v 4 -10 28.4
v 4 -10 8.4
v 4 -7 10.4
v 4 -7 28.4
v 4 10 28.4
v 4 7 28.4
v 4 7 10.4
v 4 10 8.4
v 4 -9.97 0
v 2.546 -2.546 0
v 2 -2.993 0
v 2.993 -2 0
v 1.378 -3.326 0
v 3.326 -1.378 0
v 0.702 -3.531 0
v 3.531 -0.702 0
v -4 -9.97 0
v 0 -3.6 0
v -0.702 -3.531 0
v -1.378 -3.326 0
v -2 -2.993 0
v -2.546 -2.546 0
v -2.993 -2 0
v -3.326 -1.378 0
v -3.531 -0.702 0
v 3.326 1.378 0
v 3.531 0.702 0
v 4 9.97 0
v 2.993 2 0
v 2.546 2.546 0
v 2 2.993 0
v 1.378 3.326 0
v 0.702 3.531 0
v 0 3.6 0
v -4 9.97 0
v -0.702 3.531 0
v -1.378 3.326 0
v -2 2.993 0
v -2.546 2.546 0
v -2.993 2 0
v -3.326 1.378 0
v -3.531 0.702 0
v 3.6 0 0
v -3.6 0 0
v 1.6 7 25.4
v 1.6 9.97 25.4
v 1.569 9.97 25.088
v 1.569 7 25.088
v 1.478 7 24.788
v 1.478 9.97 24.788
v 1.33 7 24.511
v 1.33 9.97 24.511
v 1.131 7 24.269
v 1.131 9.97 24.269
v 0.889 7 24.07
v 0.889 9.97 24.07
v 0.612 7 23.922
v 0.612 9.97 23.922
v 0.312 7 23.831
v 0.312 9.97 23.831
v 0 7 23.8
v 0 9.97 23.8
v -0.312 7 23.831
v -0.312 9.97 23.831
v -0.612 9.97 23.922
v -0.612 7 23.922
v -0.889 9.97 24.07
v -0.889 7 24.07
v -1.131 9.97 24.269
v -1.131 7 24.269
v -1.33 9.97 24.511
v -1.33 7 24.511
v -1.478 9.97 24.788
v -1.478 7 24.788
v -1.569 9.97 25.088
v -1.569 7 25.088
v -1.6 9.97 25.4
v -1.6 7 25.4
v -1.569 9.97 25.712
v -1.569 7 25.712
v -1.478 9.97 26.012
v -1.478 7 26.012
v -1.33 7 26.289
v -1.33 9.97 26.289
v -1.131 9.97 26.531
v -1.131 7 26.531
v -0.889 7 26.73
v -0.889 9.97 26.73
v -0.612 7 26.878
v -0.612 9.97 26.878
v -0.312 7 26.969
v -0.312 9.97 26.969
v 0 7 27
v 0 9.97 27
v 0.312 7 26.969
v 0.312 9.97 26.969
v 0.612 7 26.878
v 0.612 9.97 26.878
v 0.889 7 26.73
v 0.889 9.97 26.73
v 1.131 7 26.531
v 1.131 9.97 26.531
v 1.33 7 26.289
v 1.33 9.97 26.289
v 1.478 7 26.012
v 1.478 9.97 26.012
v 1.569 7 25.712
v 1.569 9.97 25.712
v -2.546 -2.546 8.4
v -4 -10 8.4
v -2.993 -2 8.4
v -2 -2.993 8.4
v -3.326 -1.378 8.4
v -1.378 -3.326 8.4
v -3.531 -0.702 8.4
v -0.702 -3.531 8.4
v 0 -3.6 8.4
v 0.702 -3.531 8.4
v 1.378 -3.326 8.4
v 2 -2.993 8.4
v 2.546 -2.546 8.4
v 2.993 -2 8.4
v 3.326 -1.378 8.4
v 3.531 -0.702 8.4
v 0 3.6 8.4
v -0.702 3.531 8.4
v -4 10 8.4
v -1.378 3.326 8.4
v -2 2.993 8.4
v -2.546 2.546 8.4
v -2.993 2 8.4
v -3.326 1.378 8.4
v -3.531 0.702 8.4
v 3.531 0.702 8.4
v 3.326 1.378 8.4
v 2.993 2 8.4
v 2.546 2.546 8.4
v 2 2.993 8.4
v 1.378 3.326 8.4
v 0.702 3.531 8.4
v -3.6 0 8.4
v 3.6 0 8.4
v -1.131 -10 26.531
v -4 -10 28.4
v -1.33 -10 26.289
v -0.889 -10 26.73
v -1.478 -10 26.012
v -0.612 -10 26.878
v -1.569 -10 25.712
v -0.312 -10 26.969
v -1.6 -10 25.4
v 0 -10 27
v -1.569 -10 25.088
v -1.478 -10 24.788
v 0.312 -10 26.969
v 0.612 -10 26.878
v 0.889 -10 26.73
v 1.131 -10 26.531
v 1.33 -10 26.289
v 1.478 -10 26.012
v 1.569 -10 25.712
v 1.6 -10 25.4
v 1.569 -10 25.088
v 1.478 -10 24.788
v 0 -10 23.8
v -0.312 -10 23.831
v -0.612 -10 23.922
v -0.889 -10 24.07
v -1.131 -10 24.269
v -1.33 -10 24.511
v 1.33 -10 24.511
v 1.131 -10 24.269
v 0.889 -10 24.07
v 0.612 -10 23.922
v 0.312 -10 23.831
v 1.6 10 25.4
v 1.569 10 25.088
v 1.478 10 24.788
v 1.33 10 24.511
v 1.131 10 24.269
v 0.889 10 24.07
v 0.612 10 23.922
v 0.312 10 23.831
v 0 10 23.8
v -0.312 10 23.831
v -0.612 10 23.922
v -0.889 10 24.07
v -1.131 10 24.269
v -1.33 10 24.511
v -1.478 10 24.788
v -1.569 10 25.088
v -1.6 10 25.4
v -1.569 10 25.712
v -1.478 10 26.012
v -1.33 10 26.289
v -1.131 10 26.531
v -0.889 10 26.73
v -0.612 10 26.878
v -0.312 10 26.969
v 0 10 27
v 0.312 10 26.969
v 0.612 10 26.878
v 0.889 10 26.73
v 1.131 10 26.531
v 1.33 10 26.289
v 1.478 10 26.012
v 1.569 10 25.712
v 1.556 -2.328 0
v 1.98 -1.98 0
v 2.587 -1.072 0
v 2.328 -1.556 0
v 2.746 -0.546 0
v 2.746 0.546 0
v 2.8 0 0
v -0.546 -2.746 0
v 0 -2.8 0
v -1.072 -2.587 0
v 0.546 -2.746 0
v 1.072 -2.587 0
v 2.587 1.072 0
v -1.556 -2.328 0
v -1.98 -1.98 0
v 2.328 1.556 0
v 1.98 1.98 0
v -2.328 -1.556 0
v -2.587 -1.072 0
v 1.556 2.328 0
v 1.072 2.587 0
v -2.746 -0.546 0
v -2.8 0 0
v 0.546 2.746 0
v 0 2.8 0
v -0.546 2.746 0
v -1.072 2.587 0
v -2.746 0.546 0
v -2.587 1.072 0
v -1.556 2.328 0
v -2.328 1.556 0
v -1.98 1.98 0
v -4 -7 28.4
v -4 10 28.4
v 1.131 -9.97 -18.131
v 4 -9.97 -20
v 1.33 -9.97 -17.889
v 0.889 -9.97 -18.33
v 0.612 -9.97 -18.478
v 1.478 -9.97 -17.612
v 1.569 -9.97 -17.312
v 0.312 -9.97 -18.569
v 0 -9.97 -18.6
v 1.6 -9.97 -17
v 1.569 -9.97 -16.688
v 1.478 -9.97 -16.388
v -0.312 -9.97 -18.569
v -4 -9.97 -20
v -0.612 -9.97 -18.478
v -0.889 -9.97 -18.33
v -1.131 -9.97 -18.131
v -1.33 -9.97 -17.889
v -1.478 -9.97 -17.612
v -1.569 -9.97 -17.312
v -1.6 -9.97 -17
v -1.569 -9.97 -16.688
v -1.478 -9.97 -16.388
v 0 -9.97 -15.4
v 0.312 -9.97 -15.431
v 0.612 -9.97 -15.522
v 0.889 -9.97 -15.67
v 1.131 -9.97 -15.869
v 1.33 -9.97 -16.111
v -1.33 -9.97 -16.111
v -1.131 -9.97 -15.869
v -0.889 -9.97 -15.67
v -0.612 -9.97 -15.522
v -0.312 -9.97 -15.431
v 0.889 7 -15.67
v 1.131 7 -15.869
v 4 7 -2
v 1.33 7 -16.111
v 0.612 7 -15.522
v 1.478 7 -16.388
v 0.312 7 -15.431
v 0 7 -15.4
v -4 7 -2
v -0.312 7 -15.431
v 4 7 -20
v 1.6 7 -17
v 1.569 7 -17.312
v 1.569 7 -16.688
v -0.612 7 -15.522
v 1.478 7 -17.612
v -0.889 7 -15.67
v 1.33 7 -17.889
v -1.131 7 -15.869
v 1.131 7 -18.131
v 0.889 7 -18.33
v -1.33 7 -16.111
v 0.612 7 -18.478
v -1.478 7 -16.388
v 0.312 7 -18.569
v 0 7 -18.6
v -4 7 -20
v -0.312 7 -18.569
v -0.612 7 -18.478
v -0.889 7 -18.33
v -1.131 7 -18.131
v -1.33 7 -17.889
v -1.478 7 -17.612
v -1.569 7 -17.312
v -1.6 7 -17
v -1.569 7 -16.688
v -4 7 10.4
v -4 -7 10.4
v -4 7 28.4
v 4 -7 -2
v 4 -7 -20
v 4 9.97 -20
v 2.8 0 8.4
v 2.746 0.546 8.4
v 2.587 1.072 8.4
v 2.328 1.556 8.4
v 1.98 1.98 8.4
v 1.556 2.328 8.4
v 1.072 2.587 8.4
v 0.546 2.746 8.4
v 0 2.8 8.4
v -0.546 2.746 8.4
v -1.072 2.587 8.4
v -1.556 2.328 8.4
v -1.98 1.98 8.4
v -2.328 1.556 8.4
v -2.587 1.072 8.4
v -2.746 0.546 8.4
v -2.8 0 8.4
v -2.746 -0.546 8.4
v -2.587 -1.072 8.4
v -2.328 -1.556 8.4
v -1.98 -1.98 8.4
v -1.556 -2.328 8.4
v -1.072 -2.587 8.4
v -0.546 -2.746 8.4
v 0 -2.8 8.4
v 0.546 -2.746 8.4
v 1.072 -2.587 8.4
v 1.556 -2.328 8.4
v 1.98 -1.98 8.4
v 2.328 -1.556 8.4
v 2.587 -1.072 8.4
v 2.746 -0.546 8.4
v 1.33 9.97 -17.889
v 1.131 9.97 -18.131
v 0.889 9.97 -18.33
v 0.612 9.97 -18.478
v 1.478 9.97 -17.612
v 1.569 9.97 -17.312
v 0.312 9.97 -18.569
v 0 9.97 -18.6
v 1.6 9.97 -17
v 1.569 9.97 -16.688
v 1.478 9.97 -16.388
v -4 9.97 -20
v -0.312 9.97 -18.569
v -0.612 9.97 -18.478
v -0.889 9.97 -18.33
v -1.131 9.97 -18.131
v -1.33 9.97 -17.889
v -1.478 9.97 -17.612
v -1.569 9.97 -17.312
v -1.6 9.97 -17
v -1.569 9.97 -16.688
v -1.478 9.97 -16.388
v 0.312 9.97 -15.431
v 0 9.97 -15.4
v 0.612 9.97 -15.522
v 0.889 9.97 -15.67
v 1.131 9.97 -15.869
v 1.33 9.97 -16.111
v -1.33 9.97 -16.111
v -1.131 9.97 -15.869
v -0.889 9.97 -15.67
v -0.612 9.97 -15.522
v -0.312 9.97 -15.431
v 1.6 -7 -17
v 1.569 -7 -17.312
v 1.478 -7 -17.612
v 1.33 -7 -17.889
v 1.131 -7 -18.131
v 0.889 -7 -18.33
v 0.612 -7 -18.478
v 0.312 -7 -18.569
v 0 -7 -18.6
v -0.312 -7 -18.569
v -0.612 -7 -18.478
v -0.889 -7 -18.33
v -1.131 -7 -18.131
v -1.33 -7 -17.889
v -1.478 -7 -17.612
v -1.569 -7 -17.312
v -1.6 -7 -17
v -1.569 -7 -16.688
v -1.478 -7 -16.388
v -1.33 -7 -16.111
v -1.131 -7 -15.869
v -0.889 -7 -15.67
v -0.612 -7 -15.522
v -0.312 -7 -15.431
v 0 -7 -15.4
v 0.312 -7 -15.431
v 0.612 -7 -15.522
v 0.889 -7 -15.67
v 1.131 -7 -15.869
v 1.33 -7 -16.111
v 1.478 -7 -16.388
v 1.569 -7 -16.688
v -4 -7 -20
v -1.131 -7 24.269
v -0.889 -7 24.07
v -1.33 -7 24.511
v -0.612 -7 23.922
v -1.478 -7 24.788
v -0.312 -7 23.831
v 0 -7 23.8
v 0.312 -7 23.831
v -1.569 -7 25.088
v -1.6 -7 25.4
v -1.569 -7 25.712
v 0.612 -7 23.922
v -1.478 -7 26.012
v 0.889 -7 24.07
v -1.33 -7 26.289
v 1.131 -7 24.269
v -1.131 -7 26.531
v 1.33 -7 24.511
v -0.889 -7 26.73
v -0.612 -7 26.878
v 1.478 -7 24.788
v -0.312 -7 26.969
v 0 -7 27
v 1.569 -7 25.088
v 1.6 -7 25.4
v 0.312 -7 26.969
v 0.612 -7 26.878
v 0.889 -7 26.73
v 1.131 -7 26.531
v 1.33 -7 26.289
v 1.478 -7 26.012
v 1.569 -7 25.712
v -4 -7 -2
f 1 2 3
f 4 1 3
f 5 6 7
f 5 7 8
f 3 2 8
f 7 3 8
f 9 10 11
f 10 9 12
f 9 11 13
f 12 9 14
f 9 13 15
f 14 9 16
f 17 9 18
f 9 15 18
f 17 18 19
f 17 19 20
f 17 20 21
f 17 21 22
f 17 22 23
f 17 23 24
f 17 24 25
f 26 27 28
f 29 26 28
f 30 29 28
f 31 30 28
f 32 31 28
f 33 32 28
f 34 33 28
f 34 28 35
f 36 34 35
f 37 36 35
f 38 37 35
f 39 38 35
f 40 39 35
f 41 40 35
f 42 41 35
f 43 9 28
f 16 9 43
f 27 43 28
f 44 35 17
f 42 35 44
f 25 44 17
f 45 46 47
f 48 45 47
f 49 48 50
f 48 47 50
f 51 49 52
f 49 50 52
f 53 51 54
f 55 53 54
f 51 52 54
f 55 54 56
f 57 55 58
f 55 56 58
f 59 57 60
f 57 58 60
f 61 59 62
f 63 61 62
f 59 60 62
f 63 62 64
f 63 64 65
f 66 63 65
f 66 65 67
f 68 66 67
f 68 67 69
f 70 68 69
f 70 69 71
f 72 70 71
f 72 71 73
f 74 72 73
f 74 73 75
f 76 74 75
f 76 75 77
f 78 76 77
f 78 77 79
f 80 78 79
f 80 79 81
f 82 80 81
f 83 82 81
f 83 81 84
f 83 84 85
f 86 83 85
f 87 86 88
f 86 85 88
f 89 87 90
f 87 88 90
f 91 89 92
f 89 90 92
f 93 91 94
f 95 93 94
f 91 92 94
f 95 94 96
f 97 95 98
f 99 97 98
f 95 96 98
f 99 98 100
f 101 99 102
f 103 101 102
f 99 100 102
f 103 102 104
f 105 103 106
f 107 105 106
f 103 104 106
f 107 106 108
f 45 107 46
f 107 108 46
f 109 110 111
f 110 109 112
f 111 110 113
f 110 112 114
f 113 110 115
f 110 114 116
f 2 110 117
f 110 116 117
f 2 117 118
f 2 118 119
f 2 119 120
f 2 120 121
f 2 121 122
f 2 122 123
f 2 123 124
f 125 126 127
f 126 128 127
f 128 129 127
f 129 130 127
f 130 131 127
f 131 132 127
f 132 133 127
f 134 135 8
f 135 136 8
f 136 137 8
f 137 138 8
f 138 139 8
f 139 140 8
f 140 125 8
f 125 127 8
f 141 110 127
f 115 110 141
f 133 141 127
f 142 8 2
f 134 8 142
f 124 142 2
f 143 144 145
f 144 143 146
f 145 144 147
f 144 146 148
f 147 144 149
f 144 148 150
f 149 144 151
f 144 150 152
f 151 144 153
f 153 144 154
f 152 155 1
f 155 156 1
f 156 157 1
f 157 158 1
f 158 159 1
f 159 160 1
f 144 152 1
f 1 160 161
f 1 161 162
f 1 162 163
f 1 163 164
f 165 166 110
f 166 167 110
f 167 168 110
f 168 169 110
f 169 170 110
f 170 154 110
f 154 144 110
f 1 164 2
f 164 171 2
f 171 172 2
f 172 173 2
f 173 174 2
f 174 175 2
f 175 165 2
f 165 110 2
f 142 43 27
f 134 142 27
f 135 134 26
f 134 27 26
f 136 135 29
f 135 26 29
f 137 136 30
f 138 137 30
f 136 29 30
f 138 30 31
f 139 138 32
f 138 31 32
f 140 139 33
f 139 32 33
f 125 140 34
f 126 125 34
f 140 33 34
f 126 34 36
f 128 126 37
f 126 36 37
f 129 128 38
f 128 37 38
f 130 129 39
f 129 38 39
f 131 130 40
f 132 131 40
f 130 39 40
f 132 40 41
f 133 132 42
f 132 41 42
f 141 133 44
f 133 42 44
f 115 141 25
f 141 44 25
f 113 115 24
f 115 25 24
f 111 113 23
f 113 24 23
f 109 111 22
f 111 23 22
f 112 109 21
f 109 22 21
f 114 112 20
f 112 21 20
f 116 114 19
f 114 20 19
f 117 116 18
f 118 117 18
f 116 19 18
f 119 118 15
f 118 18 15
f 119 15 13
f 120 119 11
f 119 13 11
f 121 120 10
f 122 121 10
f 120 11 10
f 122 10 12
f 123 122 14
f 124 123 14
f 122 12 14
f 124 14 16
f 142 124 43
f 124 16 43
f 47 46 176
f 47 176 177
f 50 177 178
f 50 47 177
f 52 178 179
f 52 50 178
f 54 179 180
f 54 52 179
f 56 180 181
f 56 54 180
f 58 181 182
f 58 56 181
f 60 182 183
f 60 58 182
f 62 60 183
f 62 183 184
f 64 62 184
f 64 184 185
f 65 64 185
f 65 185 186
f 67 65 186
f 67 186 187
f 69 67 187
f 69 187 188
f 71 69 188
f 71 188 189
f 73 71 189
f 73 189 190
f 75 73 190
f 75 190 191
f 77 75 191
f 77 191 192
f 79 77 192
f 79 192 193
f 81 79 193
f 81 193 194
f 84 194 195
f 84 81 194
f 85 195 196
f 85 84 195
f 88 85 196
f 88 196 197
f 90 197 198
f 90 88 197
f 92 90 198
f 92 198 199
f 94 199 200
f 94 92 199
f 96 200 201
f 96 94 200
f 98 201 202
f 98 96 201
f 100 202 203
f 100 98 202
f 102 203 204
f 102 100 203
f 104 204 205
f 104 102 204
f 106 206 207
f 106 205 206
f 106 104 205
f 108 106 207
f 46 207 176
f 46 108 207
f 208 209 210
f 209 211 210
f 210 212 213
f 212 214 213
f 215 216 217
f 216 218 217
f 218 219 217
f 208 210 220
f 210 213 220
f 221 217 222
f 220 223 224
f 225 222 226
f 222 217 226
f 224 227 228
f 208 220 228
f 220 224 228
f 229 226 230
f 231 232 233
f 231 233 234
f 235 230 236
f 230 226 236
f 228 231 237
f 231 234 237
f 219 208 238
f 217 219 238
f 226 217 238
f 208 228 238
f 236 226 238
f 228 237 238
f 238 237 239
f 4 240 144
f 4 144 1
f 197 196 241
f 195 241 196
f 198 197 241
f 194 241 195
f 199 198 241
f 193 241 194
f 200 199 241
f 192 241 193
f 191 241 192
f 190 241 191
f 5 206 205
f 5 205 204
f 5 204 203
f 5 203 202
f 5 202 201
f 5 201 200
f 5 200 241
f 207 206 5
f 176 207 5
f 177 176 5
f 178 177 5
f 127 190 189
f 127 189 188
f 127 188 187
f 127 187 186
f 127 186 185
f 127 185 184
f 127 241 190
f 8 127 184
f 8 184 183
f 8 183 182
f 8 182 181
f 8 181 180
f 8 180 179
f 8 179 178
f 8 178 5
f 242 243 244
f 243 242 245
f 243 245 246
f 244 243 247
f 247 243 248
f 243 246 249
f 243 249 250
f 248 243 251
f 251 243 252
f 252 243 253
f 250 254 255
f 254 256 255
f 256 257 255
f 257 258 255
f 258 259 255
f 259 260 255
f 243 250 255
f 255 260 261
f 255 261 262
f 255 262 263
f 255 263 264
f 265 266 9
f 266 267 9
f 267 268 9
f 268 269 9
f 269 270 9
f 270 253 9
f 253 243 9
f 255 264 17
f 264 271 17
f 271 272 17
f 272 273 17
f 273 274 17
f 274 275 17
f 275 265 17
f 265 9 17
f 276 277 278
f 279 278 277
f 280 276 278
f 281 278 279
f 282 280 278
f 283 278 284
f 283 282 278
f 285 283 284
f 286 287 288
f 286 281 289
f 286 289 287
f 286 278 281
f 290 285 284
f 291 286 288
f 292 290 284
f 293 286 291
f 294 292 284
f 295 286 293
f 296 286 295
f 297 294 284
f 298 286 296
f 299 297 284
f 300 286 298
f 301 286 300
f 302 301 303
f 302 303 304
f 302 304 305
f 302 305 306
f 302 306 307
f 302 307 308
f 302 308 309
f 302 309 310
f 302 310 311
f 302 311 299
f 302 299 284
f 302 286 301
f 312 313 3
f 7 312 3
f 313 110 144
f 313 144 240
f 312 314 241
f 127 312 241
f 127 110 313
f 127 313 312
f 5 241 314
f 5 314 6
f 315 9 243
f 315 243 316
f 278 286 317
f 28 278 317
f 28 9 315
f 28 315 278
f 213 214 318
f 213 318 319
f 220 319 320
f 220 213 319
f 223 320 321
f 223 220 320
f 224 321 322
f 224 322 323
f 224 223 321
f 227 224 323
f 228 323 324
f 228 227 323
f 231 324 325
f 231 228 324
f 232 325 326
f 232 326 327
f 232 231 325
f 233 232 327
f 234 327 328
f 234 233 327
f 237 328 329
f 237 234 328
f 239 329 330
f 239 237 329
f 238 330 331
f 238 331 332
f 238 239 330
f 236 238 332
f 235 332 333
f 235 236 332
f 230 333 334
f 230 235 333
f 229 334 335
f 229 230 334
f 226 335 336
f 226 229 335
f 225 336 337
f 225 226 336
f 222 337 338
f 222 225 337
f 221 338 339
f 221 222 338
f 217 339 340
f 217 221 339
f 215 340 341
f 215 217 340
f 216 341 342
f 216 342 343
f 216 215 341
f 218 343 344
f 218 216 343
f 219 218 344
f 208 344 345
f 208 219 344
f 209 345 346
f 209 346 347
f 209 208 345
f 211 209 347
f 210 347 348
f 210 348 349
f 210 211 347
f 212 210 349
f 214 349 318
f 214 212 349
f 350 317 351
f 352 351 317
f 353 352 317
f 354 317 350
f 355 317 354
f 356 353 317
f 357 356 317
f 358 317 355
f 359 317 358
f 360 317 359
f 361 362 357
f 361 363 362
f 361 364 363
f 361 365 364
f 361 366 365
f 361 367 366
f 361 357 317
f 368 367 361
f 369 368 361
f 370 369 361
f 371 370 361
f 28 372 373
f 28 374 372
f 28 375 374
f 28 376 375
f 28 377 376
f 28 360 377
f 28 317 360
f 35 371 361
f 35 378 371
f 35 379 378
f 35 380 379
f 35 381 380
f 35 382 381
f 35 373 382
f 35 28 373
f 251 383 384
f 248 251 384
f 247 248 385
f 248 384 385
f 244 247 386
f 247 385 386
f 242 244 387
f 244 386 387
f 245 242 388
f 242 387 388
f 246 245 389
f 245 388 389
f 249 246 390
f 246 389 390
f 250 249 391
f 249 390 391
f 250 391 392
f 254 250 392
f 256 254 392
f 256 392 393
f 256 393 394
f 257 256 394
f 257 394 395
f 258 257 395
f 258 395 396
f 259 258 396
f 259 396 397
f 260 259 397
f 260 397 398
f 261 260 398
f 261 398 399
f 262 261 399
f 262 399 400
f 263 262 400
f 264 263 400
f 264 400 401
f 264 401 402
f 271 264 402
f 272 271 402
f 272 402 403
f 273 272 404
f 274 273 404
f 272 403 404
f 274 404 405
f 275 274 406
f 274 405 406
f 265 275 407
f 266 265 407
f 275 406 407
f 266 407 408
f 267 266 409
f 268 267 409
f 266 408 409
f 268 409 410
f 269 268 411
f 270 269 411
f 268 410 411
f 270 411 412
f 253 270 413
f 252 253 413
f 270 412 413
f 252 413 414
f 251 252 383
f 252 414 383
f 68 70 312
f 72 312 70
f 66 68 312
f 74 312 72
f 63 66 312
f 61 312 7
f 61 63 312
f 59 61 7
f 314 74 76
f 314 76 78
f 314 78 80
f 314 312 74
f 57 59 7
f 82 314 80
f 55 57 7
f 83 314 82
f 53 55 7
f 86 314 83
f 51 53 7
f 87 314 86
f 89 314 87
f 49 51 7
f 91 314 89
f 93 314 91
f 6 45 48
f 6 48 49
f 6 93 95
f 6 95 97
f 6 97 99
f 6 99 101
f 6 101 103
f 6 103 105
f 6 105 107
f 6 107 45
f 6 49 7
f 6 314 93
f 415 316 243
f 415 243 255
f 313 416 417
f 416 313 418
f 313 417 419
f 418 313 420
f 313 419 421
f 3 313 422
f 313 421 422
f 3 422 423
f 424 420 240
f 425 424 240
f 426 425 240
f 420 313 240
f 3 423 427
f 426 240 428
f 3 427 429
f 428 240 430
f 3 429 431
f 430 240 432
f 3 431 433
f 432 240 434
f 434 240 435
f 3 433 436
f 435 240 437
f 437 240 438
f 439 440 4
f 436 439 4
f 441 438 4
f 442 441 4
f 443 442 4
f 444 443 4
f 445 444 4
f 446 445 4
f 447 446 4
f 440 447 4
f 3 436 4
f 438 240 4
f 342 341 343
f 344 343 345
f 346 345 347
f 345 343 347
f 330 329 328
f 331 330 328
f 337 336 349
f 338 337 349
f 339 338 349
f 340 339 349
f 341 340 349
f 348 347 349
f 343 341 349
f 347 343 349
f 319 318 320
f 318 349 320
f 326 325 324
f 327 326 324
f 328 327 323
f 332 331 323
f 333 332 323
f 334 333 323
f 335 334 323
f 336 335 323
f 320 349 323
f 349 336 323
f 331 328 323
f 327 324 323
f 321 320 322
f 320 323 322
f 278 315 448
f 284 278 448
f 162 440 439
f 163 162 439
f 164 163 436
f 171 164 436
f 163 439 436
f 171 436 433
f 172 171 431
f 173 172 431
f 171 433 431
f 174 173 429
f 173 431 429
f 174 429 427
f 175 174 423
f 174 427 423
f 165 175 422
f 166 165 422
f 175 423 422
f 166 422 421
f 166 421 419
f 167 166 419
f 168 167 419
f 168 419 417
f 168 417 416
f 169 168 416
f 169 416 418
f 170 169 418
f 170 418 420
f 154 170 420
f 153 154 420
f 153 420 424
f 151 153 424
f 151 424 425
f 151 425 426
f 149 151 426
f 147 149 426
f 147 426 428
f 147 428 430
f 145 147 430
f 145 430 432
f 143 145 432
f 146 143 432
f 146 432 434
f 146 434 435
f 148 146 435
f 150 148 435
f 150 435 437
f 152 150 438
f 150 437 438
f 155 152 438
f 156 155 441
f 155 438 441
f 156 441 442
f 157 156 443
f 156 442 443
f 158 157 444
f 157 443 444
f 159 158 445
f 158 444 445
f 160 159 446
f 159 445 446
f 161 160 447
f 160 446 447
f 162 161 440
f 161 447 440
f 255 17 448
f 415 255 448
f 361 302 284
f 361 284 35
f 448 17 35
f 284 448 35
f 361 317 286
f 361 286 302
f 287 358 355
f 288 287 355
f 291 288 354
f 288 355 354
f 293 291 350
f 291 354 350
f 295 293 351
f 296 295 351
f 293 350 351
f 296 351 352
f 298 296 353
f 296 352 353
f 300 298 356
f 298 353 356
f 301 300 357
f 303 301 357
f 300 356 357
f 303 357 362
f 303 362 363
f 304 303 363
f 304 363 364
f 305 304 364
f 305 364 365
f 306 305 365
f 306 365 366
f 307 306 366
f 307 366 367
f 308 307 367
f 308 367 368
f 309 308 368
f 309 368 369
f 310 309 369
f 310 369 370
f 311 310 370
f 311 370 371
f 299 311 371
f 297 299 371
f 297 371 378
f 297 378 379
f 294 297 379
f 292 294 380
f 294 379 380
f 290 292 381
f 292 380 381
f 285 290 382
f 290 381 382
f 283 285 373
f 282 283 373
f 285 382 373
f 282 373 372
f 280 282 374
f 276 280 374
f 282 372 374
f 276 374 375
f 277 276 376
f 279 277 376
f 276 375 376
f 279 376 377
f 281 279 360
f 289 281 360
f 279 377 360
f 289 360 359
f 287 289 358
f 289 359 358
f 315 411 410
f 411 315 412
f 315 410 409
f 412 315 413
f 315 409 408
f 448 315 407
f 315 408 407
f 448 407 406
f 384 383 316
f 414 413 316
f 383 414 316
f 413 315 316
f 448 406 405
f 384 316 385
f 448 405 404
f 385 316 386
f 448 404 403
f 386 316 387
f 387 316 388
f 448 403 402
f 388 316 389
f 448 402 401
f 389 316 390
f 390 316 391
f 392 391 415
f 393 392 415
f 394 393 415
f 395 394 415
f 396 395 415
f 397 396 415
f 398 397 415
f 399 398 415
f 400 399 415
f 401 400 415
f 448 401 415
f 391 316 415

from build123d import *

# Parameters (mm, degrees)
SKETCH_1_R               = 3.6
SKETCH_1_R_2             = 2.8
EXTRUDE_1_DEPTH          = 8.4
SKETCH_2_W               = 8
SKETCH_2_H               = 19.939100818
EXTRUDE_2_DEPTH          = 20
SKETCH_3_W               = 8
SKETCH_3_H               = 20
EXTRUDE_3_DEPTH          = 20
SKETCH_4_W               = 8
SKETCH_4_H               = 14
CUT_EXTRUDE_2_DEPTH      = 18
SKETCH_5_W               = 8
SKETCH_5_H               = 14
CUT_EXTRUDE_3_DEPTH      = 18
SKETCH_6_R               = 1.6
CUT_EXTRUDE_4_DEPTH      = 10
CUT_EXTRUDE_4_DEPTH_BACK = 29


with BuildPart() as part:
    # 草图1 → 凸台-拉伸1 (new body)
    with BuildSketch(Plane.XY):
        Circle(SKETCH_1_R)
        Circle(SKETCH_1_R_2, mode=Mode.SUBTRACT)
    extrude(amount=EXTRUDE_1_DEPTH)

    # 草图2 → 凸台-拉伸2 (add)
    with BuildSketch(Plane(origin=(0, 0, 0), x_dir=(-1, 0, 0), z_dir=(0, 0, -1))):
        Rectangle(SKETCH_2_W, SKETCH_2_H)
    extrude(amount=EXTRUDE_2_DEPTH)

    # 草图3 → 凸台-拉伸3 (add)
    with BuildSketch(Plane.XY.offset(8.4)):
        Rectangle(SKETCH_3_W, SKETCH_3_H)
    extrude(amount=EXTRUDE_3_DEPTH)

    # 草图4 → 切除-拉伸2 (cut)
    with BuildSketch(Plane(origin=(0, 0, -20), x_dir=(-1, 0, 0), z_dir=(0, 0, -1))):
        Rectangle(SKETCH_4_W, SKETCH_4_H)
    extrude(amount=-CUT_EXTRUDE_2_DEPTH, mode=Mode.SUBTRACT)

    # 草图5 → 切除-拉伸3 (cut)
    with BuildSketch(Plane.XY.offset(28.4)):
        Rectangle(SKETCH_5_W, SKETCH_5_H)
    extrude(amount=-CUT_EXTRUDE_3_DEPTH, mode=Mode.SUBTRACT)

    # 草图6 → 切除-拉伸4 (cut, two sides)
    with BuildSketch(Plane(origin=(0, 9.969550409, 0), x_dir=(1, 0, 0), z_dir=(0, 1, 0))) as cut_extrude_4_sk:
        with Locations((0, 17)):
            Circle(SKETCH_6_R)
        with Locations((0, -25.4)):
            Circle(SKETCH_6_R)
    extrude(amount=CUT_EXTRUDE_4_DEPTH, mode=Mode.SUBTRACT)
    extrude(cut_extrude_4_sk.sketch, amount=-CUT_EXTRUDE_4_DEPTH_BACK, mode=Mode.SUBTRACT)


solid = part.part
